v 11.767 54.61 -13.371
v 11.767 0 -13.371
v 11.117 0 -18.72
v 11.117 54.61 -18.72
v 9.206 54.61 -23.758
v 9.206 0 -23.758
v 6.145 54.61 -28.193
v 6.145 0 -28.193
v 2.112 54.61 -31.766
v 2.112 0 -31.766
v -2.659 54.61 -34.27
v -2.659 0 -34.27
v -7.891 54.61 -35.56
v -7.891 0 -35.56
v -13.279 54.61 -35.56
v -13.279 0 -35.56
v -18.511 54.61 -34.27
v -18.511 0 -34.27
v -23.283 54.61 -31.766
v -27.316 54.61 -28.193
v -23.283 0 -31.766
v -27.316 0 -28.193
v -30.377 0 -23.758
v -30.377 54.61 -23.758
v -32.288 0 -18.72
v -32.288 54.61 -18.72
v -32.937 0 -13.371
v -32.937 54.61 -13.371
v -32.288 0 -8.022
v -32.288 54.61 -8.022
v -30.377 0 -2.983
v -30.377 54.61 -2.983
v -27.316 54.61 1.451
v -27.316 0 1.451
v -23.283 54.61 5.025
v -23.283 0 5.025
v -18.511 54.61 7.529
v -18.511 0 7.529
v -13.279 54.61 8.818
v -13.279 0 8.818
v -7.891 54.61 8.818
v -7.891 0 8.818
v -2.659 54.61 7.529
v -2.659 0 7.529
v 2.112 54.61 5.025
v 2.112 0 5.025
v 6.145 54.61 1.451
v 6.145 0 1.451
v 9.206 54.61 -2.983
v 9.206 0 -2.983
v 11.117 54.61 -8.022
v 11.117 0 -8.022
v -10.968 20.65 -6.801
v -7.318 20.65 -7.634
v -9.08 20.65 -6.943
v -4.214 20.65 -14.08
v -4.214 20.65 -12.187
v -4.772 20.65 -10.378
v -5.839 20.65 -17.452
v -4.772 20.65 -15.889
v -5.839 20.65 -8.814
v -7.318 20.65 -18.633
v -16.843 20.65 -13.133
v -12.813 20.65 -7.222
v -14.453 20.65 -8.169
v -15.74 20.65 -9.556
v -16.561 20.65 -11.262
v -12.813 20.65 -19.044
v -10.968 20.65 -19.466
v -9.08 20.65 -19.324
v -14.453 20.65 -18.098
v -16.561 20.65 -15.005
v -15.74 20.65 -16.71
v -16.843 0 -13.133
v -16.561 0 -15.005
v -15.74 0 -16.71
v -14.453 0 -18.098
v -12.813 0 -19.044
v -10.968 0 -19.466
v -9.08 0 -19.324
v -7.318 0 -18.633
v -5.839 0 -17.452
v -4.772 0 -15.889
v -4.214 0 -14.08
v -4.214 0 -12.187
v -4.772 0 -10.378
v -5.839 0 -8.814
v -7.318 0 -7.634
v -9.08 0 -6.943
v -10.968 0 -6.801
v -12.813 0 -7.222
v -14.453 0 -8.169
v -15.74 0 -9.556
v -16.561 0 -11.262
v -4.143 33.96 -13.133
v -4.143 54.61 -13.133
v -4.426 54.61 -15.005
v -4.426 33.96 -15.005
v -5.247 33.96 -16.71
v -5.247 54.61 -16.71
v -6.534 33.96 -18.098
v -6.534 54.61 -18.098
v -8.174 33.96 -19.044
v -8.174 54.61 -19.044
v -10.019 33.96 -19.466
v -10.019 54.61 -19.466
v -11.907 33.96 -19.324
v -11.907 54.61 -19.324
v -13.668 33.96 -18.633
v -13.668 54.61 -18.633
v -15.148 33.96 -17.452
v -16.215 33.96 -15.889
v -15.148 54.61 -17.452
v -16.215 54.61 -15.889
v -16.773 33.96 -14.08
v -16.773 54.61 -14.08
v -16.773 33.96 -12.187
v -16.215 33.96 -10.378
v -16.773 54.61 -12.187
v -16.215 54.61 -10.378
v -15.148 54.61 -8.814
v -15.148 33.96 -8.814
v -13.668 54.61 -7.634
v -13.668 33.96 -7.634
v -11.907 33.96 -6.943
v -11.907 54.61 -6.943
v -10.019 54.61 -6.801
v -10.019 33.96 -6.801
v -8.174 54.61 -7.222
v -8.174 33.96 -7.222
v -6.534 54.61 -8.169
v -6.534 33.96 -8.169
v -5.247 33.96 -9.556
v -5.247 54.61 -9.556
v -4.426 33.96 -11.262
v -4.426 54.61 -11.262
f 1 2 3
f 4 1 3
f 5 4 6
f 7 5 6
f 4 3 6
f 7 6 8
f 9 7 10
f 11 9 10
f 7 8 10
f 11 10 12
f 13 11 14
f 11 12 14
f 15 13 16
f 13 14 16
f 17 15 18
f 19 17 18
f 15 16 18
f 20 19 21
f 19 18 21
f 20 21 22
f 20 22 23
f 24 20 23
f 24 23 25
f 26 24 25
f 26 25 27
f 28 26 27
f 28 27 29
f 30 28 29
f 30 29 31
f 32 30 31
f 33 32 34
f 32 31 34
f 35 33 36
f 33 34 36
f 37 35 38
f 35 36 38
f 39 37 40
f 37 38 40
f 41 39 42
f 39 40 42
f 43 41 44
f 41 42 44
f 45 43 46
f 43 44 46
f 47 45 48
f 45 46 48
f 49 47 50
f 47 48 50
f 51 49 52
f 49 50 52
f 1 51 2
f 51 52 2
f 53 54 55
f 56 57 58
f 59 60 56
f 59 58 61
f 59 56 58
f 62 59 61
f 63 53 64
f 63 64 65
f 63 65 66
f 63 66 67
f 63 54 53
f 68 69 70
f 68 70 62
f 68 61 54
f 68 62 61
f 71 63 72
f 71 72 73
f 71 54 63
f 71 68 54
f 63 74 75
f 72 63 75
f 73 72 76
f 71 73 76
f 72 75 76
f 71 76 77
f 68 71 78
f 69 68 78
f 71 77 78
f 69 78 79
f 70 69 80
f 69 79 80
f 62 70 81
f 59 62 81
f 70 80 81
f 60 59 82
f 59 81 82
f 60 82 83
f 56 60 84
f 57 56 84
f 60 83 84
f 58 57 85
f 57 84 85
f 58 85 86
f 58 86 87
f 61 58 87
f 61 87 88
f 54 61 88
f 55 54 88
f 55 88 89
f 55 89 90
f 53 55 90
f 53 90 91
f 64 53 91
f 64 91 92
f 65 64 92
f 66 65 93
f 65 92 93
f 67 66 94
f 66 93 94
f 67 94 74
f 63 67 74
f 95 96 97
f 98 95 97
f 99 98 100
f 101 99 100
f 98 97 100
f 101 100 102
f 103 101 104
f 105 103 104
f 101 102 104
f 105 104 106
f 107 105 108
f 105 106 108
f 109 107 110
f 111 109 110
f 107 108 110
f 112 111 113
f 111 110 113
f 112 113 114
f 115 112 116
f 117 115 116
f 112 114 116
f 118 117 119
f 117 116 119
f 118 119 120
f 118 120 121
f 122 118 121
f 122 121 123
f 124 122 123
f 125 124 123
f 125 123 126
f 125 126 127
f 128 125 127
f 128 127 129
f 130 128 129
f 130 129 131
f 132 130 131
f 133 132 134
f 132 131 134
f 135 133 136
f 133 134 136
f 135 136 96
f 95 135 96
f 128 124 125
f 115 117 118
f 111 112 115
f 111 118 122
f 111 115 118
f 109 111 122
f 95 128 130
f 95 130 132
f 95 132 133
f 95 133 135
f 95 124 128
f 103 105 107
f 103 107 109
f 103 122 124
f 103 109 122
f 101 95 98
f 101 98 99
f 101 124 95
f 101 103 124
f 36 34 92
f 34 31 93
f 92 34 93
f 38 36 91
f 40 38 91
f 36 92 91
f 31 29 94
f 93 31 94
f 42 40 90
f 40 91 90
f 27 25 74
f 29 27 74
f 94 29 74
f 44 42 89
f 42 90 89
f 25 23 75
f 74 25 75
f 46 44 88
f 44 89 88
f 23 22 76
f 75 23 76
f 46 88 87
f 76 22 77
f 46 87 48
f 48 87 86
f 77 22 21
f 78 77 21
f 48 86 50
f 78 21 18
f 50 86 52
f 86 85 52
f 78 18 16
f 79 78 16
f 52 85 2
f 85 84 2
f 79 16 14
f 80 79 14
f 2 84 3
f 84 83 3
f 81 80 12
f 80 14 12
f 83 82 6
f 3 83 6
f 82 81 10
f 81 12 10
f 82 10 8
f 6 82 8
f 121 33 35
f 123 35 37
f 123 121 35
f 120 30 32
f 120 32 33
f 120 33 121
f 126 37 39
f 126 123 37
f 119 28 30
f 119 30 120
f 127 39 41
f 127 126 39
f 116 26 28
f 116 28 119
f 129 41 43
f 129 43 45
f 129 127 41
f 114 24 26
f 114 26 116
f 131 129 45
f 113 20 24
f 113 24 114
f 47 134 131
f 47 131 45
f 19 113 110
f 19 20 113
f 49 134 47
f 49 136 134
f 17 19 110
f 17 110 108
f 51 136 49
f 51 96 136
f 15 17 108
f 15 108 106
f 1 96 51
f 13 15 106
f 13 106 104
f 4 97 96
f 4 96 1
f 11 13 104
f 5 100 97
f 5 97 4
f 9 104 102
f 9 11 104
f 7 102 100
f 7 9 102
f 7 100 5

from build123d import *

# Parameters (mm, degrees)
SKETCH1_R           = 22.352
BOSS_EXTRUDE1_DEPTH = 54.61
SKETCH2_R           = 6.35
CUT_EXTRUDE1_DEPTH  = 20.6502
SKETCH3_R           = 6.35
CUT_EXTRUDE2_DEPTH  = 20.6502


with BuildPart() as part:
    # Sketch1 → Boss-Extrude1 (new body)
    with BuildSketch(Plane(origin=(0, 0, 0), x_dir=(1, 0, 0), z_dir=(0, 1, 0))):
        with Locations((-10.585213669, 13.370796213)):
            Circle(SKETCH1_R)
    extrude(amount=BOSS_EXTRUDE1_DEPTH)

    # Sketch2 → Cut-Extrude1 (cut)
    with BuildSketch(Plane(origin=(0, 54.61, 0), x_dir=(1, 0, 0), z_dir=(0, 1, 0))):
        with Locations((-10.493492602, 13.133399692)):
            Circle(SKETCH2_R)
    extrude(amount=-CUT_EXTRUDE1_DEPTH, mode=Mode.SUBTRACT)

    # Sketch3 → Cut-Extrude2 (cut)
    with BuildSketch(Plane(origin=(0, 0, 0), x_dir=(-1, 0, 0), z_dir=(0, -1, 0))):
        with Locations((10.493492678, 13.133399692)):
            Circle(SKETCH3_R)
    extrude(amount=-CUT_EXTRUDE2_DEPTH, mode=Mode.SUBTRACT)


solid = part.part
